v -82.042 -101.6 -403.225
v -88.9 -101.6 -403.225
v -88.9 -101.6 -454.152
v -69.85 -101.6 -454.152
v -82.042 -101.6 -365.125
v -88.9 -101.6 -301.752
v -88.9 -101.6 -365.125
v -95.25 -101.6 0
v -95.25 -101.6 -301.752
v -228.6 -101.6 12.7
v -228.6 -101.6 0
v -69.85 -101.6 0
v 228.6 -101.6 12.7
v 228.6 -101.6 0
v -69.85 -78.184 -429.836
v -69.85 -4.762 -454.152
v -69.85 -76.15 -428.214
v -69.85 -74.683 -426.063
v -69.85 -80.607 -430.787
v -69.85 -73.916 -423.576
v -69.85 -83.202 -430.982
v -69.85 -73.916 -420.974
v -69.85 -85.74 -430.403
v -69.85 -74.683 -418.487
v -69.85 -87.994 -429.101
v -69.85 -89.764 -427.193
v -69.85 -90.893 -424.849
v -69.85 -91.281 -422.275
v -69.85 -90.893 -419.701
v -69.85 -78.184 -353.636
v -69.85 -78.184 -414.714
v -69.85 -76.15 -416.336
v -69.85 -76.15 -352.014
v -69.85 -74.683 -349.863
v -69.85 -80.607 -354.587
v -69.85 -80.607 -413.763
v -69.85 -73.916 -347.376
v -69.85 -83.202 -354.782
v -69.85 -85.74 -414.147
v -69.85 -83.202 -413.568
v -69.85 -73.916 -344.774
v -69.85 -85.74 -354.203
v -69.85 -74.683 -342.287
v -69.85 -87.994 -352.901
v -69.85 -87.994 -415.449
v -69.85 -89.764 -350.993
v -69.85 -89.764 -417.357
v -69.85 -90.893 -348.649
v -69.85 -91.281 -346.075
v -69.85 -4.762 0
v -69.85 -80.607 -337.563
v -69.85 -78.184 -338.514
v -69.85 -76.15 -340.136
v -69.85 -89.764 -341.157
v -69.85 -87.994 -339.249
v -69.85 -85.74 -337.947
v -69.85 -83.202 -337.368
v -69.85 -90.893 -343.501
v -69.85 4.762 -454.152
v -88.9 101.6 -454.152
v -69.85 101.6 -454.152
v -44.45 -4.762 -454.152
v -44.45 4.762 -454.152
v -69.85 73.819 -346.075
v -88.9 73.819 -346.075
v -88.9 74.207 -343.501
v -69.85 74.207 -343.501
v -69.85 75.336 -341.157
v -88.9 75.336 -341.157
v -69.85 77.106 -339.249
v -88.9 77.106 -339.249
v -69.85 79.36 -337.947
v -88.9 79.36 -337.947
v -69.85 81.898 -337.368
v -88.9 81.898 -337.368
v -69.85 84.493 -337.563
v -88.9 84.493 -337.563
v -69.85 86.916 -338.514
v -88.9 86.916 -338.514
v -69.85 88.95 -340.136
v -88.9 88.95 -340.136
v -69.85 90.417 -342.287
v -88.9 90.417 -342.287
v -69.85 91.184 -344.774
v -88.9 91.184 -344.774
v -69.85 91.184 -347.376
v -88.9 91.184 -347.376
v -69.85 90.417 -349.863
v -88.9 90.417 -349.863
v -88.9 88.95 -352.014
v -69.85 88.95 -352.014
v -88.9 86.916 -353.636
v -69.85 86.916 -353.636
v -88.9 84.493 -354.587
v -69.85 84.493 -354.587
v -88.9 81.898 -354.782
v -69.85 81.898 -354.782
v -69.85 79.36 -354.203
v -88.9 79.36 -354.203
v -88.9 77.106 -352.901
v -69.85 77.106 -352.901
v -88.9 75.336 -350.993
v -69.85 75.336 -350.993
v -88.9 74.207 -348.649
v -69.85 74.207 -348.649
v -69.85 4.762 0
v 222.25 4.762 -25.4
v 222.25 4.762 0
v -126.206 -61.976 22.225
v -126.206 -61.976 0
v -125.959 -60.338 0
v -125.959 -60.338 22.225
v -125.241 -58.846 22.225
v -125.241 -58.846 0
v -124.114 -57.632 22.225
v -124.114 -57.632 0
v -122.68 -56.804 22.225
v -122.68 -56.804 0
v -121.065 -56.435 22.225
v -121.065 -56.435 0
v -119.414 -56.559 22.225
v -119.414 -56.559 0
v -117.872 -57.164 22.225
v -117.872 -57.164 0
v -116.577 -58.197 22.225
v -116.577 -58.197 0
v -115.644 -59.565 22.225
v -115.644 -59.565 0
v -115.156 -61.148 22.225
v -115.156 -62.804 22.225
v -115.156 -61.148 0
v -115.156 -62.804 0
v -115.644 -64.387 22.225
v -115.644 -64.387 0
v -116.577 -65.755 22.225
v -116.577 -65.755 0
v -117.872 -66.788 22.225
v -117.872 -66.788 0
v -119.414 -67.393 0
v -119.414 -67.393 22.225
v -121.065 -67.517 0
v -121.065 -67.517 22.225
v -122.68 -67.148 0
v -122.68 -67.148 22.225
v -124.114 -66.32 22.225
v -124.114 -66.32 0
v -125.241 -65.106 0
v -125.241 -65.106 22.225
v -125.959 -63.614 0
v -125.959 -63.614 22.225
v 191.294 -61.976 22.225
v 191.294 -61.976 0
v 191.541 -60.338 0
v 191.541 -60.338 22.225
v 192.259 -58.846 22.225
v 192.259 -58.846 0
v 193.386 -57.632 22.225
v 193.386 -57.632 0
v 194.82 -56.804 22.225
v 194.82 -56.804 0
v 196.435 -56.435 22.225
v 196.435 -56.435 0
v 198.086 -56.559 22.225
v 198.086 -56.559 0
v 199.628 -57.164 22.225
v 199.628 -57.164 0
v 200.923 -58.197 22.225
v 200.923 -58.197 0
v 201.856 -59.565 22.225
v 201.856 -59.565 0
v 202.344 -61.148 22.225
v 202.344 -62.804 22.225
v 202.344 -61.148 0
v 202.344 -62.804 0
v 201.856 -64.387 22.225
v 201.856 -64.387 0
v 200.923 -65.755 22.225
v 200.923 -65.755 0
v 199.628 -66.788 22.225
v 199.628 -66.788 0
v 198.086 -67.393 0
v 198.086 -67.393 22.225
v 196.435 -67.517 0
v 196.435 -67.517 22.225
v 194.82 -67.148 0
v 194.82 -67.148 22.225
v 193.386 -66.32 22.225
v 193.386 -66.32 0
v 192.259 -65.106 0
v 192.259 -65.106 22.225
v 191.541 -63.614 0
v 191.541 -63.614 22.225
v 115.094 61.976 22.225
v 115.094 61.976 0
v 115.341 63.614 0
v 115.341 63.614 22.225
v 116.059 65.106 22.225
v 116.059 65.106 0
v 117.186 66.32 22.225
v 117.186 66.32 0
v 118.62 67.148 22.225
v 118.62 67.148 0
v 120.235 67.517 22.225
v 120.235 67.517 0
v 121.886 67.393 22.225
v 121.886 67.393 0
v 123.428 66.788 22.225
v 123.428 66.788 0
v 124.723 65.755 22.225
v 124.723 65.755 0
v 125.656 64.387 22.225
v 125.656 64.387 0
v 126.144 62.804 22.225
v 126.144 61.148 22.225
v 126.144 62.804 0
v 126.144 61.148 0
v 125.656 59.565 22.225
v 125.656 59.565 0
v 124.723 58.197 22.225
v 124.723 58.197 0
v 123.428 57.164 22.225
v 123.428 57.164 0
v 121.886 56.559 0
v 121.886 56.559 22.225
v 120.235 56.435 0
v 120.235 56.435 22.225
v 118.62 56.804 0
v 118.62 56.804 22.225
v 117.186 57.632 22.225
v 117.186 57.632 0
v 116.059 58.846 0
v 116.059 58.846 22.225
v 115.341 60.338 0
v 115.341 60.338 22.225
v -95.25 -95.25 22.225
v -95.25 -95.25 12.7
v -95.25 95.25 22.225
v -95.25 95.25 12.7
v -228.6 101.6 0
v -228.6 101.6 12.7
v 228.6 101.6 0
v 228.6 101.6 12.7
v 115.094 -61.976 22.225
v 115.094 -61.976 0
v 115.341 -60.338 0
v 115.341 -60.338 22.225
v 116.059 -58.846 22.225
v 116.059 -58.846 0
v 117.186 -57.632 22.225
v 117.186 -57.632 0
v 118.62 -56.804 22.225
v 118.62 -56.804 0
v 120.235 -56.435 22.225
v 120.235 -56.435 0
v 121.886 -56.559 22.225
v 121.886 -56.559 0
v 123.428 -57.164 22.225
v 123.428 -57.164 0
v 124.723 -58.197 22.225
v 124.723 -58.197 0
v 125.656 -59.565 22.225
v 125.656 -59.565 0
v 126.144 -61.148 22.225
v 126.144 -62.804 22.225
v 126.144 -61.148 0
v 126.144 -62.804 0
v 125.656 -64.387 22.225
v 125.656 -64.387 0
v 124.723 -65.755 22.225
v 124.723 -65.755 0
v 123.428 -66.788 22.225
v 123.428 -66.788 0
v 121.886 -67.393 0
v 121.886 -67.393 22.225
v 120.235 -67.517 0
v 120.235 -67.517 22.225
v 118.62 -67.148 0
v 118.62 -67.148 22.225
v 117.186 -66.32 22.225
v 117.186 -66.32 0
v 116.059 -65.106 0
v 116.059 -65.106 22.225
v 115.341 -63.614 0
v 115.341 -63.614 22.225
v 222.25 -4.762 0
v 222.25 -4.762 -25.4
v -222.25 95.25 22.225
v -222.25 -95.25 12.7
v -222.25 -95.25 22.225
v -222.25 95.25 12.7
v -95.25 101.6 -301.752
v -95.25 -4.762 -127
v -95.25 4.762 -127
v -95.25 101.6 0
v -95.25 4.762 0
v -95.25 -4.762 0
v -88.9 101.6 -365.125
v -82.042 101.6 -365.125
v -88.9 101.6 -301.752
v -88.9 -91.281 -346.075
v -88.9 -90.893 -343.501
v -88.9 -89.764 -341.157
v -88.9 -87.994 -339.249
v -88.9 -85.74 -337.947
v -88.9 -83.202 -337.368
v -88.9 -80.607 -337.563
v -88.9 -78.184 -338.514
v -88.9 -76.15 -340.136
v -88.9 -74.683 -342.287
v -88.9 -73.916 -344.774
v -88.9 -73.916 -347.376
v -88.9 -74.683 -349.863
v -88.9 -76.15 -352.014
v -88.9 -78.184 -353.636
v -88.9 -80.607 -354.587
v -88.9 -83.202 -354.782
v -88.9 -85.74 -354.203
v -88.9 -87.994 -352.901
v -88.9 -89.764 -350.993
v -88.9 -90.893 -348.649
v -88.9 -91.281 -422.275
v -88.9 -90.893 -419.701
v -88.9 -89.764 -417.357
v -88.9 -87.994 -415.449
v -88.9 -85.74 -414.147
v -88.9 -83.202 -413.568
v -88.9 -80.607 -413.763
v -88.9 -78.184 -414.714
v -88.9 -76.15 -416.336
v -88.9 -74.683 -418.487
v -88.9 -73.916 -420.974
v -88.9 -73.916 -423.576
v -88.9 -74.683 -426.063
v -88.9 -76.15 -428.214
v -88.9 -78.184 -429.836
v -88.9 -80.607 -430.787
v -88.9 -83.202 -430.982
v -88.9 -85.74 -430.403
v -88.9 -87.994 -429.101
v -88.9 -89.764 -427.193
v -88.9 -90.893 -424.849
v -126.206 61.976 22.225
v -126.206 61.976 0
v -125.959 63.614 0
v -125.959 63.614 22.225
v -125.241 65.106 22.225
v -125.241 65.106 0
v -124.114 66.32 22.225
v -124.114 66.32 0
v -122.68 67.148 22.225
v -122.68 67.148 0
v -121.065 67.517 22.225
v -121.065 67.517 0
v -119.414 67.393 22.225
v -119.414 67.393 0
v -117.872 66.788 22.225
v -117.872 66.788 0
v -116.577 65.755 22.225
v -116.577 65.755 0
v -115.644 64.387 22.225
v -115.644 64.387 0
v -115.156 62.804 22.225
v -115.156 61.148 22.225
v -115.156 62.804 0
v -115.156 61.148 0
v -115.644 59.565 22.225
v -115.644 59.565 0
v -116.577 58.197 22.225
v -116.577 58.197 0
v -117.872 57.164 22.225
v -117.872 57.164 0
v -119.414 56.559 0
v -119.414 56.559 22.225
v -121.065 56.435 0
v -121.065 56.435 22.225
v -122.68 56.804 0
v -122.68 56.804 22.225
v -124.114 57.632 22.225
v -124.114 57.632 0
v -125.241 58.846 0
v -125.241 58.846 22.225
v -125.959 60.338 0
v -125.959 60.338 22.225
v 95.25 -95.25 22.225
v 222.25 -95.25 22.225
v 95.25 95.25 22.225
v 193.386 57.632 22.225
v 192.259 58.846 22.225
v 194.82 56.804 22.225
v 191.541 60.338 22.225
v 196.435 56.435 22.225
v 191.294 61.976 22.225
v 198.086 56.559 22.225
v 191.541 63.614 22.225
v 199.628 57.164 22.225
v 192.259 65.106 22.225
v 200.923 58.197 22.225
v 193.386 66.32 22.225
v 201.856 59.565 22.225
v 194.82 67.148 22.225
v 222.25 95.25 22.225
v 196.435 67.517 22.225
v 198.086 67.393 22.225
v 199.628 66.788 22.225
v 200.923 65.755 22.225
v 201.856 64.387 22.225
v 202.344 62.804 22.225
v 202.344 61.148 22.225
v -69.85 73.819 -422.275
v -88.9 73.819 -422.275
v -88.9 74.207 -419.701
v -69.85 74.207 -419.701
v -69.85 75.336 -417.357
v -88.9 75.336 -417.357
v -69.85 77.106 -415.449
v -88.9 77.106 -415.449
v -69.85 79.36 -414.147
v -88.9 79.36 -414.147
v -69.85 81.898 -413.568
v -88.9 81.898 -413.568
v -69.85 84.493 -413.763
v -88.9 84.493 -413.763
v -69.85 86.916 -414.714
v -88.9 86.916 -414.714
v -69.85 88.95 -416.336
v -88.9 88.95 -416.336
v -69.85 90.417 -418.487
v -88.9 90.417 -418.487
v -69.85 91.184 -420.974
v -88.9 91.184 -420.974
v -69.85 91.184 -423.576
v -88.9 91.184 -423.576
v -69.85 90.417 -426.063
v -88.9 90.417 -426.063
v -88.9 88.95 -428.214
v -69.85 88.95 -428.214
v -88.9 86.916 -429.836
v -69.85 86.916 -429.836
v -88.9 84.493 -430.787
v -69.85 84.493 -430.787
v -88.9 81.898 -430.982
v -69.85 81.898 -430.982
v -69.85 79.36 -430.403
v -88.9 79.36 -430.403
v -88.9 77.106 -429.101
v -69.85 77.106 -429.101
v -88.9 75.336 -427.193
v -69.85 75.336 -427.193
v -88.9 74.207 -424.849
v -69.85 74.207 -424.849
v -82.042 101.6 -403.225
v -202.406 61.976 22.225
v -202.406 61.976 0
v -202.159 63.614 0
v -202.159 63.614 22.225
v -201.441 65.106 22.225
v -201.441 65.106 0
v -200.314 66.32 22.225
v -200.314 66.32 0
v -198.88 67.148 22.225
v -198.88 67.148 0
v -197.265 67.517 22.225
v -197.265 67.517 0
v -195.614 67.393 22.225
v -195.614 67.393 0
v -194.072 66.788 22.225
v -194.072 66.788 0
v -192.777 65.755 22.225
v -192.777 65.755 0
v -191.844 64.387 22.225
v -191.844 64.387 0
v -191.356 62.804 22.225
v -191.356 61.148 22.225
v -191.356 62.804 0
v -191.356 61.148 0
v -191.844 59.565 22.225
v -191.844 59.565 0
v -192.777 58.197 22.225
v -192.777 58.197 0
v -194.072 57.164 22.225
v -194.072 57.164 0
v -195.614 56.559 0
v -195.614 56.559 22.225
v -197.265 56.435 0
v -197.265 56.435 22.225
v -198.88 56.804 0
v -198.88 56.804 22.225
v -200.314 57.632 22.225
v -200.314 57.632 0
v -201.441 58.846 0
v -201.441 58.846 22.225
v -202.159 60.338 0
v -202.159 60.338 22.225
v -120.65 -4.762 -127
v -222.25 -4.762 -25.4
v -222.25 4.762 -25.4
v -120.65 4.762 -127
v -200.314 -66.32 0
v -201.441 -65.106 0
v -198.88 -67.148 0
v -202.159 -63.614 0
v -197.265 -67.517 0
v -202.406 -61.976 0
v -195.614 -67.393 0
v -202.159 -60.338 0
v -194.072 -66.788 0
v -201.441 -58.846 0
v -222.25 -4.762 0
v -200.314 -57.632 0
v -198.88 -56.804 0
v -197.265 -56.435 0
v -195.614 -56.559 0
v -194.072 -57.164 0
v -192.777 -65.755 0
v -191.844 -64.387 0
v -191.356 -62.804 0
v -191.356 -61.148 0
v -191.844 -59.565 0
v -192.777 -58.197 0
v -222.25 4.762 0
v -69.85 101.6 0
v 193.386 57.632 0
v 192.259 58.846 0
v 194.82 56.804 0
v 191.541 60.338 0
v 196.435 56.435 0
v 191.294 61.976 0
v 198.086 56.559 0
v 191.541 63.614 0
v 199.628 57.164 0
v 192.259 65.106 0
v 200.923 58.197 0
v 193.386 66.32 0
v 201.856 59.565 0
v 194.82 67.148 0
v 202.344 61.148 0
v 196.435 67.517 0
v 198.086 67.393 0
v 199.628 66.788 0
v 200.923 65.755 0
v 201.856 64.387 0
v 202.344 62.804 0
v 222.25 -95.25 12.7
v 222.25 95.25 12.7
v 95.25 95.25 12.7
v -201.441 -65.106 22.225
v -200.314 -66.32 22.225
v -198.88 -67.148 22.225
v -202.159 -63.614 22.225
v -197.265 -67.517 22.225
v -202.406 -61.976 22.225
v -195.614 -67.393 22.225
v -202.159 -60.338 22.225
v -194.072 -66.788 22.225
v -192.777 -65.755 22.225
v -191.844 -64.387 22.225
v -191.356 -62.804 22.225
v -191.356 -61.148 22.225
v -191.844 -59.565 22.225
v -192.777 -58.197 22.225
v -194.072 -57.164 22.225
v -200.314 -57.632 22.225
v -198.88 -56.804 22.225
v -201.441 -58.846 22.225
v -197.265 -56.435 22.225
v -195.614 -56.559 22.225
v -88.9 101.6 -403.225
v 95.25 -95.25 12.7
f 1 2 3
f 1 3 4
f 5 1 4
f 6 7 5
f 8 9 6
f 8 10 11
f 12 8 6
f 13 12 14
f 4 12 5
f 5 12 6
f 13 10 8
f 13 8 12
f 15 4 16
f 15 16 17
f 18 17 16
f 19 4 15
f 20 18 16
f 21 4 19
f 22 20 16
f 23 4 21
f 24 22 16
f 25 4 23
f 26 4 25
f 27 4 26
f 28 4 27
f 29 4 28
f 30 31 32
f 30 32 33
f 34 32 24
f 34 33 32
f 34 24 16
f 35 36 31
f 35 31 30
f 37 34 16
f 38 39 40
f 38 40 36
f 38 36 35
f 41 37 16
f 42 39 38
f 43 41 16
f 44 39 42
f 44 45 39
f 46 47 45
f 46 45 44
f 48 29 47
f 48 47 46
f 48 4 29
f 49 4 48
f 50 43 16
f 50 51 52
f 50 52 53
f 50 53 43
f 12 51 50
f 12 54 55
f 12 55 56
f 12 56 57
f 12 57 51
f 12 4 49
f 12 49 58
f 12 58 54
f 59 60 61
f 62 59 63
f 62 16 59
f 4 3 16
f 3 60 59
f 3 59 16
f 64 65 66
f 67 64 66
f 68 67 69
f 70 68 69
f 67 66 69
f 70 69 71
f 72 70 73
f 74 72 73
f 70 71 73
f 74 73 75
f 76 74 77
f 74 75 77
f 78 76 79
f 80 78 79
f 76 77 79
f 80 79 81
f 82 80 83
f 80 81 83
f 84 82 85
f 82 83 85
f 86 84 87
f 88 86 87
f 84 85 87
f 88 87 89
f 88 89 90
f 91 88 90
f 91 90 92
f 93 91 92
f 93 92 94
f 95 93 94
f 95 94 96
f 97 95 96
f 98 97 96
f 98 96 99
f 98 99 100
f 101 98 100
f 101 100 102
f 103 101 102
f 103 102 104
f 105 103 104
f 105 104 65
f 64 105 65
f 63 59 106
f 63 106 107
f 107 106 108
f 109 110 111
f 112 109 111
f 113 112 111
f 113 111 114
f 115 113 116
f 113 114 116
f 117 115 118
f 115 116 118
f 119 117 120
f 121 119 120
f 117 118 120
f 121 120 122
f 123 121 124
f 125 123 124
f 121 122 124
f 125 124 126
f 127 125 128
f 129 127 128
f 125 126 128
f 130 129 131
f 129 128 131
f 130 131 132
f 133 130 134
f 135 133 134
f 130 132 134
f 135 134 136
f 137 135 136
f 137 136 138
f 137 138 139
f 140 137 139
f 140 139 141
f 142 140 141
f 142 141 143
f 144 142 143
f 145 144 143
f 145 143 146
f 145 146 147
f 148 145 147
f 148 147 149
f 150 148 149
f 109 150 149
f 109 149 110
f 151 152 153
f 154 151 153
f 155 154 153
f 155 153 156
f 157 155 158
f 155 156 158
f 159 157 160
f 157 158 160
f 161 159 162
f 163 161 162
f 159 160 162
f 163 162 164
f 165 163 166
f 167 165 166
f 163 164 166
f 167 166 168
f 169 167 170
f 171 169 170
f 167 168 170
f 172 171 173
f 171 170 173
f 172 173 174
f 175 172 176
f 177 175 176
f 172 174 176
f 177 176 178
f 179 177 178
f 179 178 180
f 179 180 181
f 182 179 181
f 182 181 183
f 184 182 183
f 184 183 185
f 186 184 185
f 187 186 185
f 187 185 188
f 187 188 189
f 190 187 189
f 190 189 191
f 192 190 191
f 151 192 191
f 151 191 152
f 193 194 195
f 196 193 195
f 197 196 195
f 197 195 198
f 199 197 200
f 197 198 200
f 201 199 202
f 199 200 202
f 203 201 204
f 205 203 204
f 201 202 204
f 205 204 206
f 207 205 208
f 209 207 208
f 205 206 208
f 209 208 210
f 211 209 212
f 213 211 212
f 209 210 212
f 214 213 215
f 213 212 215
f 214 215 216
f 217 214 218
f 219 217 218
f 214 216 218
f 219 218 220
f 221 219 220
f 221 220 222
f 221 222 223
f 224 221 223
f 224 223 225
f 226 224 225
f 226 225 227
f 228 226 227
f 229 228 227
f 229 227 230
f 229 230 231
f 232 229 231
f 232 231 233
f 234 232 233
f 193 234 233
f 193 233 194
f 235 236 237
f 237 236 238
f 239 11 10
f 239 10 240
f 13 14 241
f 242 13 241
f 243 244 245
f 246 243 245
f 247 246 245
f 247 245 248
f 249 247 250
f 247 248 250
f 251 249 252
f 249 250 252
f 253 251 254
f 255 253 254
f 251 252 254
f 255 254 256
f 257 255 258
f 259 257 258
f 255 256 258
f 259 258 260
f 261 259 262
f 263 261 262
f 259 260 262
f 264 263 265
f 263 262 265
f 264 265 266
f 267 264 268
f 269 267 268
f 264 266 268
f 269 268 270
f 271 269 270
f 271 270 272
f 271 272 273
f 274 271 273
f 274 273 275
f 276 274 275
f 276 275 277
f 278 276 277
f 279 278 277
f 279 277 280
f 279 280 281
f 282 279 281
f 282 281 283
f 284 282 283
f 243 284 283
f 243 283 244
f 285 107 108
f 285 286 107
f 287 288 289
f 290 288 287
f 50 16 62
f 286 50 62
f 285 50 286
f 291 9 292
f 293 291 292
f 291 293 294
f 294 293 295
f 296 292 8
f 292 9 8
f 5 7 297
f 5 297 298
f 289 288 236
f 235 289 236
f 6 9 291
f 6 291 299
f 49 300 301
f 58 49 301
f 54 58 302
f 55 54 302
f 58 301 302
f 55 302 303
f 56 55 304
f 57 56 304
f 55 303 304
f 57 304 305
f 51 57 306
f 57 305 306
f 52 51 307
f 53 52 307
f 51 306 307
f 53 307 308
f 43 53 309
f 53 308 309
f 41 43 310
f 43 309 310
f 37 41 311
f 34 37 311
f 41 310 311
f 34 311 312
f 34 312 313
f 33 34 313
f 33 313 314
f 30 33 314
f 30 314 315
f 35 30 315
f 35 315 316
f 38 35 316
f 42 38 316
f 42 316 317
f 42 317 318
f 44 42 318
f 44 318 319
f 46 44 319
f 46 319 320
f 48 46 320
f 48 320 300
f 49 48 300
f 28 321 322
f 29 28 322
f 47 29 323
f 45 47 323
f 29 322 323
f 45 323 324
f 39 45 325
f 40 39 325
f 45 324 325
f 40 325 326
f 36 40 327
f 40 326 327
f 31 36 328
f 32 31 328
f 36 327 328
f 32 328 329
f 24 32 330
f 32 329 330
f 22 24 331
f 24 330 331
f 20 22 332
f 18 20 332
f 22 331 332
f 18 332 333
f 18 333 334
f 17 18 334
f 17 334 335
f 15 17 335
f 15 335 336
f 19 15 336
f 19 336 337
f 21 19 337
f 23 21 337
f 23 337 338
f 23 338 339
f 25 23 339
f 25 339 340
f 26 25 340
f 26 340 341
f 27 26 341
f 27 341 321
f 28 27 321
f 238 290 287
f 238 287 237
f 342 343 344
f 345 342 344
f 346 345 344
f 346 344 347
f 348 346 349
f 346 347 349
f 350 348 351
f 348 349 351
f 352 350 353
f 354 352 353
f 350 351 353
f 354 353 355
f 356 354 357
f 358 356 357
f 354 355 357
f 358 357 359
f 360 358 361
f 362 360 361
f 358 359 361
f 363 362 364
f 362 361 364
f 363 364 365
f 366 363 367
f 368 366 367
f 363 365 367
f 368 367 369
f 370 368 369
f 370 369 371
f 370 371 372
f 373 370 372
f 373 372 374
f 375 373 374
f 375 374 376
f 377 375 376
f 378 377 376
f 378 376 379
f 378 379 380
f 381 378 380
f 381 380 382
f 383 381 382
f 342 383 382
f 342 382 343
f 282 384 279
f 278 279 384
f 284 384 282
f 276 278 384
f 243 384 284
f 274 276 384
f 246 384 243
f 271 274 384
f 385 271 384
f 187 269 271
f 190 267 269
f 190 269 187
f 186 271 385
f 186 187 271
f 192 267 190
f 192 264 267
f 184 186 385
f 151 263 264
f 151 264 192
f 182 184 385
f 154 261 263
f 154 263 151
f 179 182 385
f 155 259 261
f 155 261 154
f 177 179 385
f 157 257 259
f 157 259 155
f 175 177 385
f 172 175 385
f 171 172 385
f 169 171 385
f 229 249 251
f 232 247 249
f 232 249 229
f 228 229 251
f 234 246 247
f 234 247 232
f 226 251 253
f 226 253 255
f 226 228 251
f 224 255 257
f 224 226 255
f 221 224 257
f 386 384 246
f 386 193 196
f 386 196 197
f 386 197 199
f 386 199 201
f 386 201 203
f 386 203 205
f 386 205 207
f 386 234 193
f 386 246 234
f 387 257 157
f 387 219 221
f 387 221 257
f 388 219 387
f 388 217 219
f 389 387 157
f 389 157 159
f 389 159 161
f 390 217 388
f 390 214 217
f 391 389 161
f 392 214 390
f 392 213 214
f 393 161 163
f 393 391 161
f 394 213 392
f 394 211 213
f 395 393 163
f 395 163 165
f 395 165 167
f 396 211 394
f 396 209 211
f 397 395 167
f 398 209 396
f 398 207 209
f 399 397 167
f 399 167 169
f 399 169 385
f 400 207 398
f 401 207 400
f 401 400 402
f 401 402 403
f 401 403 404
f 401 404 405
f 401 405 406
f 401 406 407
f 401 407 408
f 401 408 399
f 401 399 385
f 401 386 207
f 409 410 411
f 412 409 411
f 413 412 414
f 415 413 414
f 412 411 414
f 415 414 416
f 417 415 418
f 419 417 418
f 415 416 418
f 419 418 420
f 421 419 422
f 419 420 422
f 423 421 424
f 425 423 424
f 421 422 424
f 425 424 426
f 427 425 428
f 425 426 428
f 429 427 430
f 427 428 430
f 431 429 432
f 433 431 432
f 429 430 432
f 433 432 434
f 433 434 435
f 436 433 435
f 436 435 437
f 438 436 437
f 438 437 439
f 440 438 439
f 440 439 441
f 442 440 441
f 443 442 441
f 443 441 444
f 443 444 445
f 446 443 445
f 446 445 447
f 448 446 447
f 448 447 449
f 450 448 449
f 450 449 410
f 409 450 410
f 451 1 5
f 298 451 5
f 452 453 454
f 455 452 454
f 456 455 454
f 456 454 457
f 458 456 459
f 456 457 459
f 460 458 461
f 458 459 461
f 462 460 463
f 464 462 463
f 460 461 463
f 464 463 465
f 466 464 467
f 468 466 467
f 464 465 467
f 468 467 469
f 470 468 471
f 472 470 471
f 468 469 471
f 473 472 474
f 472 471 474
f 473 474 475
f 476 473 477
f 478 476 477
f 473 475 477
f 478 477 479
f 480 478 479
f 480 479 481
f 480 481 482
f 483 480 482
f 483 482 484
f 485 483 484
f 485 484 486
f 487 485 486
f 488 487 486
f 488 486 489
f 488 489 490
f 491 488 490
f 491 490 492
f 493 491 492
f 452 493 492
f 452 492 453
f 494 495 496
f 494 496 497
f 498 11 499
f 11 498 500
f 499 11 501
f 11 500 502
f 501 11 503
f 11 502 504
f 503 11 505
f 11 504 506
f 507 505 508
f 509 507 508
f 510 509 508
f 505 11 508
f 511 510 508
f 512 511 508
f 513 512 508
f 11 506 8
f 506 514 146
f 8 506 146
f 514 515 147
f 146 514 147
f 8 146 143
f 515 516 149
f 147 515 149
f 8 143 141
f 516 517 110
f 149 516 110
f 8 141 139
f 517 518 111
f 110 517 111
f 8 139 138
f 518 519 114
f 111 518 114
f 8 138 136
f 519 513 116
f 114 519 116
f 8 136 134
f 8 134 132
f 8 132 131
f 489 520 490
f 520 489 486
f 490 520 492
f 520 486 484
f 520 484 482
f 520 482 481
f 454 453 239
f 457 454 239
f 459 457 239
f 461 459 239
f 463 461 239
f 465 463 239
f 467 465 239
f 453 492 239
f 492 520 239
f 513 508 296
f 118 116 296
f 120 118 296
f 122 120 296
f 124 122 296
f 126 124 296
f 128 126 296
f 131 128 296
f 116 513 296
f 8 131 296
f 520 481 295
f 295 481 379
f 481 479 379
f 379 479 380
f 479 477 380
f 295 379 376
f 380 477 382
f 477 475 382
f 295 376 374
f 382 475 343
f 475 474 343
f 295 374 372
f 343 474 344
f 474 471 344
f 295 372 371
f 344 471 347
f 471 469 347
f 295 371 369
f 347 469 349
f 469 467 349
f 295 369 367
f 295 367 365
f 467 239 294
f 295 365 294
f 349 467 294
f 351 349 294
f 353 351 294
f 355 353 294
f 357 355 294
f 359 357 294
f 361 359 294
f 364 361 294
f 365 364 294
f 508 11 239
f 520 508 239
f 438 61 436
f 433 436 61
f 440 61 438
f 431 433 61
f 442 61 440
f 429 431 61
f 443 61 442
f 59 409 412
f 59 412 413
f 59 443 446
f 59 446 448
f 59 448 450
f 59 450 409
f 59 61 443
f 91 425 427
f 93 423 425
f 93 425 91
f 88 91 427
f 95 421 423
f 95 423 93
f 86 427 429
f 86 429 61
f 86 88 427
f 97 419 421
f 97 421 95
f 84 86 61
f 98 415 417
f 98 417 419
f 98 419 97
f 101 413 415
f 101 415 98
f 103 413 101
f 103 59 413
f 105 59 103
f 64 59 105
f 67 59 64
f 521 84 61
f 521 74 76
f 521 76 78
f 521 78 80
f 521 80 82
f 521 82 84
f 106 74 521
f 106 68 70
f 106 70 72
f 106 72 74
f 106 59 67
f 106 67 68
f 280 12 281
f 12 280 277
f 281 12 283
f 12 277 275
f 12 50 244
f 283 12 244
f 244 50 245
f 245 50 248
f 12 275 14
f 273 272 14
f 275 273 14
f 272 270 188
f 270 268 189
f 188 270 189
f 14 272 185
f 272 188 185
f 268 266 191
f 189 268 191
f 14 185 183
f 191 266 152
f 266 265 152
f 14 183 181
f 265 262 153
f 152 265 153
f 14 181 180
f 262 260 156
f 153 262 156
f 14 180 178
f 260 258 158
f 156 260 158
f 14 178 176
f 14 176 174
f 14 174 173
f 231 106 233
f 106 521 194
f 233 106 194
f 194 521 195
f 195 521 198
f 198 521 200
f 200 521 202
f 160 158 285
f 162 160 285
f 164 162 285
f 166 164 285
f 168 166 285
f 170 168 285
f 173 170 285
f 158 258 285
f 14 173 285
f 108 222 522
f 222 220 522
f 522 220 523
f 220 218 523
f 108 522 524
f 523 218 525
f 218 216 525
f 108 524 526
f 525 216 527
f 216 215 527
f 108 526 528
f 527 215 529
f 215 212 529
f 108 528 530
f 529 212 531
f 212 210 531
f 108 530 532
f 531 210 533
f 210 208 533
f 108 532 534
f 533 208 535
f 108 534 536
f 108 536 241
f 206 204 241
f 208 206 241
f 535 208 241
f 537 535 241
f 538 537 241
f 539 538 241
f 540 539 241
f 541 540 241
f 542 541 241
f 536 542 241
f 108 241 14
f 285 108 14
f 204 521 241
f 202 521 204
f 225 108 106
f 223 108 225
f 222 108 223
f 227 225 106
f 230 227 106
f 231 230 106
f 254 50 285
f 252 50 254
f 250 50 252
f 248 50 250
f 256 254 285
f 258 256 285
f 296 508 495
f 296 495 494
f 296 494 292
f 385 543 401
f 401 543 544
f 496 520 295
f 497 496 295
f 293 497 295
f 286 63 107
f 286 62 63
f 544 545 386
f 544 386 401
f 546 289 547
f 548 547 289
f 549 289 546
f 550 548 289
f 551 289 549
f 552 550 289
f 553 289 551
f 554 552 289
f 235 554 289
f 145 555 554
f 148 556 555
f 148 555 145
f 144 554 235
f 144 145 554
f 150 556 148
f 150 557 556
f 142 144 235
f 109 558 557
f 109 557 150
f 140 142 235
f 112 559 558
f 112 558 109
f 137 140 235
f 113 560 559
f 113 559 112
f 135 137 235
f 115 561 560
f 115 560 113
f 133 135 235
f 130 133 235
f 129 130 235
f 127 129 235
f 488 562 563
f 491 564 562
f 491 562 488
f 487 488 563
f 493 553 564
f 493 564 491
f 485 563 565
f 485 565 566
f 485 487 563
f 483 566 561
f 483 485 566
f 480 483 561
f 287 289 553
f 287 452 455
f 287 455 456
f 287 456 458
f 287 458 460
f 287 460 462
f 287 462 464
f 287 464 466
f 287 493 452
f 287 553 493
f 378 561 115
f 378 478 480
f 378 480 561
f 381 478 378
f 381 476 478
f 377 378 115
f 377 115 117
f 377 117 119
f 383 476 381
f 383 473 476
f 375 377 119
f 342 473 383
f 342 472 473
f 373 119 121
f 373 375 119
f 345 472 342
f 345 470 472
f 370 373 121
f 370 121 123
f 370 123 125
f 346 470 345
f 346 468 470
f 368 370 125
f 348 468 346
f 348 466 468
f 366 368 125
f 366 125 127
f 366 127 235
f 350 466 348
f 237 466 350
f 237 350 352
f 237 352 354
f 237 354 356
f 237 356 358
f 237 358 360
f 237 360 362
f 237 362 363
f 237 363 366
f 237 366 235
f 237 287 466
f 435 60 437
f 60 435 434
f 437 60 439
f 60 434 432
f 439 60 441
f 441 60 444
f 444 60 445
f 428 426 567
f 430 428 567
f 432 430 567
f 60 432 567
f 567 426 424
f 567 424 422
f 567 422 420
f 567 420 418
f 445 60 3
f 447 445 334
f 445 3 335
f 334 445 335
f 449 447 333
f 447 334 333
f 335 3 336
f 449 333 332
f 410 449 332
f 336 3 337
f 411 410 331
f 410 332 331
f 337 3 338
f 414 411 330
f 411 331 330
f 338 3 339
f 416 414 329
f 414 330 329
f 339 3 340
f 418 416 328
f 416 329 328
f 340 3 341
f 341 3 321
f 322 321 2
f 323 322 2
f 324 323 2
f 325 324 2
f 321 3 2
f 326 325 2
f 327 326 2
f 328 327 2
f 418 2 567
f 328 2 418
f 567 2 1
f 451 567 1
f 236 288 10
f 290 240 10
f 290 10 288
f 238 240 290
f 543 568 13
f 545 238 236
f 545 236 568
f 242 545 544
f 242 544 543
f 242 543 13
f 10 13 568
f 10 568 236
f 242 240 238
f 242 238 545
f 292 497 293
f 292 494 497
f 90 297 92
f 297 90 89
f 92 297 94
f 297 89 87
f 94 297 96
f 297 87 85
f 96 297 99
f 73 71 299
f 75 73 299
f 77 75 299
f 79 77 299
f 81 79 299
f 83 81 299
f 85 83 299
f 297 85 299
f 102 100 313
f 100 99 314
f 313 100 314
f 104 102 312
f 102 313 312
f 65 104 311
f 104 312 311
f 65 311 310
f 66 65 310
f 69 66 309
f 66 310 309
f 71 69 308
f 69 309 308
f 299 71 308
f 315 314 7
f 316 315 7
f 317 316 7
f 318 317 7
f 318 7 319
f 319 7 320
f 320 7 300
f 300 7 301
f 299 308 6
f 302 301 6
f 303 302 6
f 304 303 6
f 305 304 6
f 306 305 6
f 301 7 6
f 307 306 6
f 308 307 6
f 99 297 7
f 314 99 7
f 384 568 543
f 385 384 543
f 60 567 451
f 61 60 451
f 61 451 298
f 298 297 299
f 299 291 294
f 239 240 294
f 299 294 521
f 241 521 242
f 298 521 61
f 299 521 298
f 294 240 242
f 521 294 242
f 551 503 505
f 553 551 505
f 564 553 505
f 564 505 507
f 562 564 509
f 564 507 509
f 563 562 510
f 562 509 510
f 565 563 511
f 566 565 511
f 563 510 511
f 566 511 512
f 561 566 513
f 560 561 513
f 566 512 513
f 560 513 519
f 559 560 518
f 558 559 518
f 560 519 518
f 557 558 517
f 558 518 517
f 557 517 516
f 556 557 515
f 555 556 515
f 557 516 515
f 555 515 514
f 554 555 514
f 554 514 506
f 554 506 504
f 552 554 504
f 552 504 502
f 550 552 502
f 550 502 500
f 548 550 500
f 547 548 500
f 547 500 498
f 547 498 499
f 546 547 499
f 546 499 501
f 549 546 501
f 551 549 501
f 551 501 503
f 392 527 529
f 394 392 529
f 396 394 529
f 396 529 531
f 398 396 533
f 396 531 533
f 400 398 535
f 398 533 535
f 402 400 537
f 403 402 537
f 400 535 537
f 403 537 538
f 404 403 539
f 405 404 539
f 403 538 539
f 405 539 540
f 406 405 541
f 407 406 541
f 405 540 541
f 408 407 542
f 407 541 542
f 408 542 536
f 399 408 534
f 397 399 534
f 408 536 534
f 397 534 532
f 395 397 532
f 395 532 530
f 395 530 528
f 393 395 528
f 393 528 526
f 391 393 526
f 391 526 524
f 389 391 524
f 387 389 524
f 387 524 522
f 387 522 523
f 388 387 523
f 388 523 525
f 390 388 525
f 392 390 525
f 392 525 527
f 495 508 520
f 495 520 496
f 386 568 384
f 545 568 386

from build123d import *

# Parameters (mm, degrees)
F0_W      = 457.2
F0_H      = 203.2
F1_DEPTH  = 12.7
F2_W      = 127
F2_H      = 190.5
F3_DEPTH  = 9.525
F5_D      = 11.1125
F7_DEPTH  = 4.7625
F9_DEPTH  = 4.7625
F10_W     = 25.4
F10_H     = 454.152
F11_DEPTH = 101.6
F12_W     = 44.551104
F12_H     = 159.36184
F13_DEPTH = 203.201
F14_W     = 96.83972
F14_H     = 38.1
F15_DEPTH = 203.201
F17_D     = 17.4625


with BuildPart() as f1:
    # F0 (on Top) → F1 (new body)
    with BuildSketch(Plane.XY):
        Rectangle(F0_W, F0_H)
    extrude(amount=F1_DEPTH)

    # F2 (on face) → F3 (join)
    with BuildSketch(Plane.XY.offset(12.7)):
        with Locations((158.75, 0)):
            Rectangle(F2_W, F2_H)
        with Locations((-158.75, 0)):
            Rectangle(F2_W, F2_H)
    extrude(amount=F3_DEPTH)

    # F5 (through all)
    with Locations(Plane.XY.offset(22.225)):
        with Locations((-196.85, 61.976), (-120.65, 61.976), (-196.85, -61.976), (-120.65, -61.976), (120.65, 61.976), (196.85, 61.976), (196.85, -61.976), (120.65, -61.976)):
            Hole(F5_D / 2)

    # F6 (on Front) → F7 (join, symmetric)
    with BuildSketch(Plane.XZ):
        Polygon((-95.25, 0), (-222.25, 0), (-222.25, -25.4), (-120.65, -127), (-95.25, -127), align=None)
    extrude(amount=F7_DEPTH, both=True)

    # F8 (on Front) → F9 (join, symmetric)
    with BuildSketch(Plane.XZ):
        Polygon((222.25, -25.4), (222.25, 0), (-69.85, 0), (-69.85, -454.152), (-44.45, -454.152), align=None)
    extrude(amount=F9_DEPTH, both=True)

    # F10 (on Front) → F11 (join, symmetric)
    with BuildSketch(Plane.XZ):
        with Locations((-82.55, -227.076)):
            Rectangle(F10_W, F10_H)
    extrude(amount=F11_DEPTH, both=True)

    # F12 (on face) → F13 (cut, through all)
    with BuildSketch(Plane.XZ.offset(101.6)):
        with Locations((-111.175552, -381.43292)):
            Rectangle(F12_W, F12_H)
    extrude(amount=-F13_DEPTH, mode=Mode.SUBTRACT)

    # F14 (on face) → F15 (cut, through all)
    with BuildSketch(Plane.XZ.offset(101.6)):
        with Locations((-130.46186, -384.175)):
            Rectangle(F14_W, F14_H)
    extrude(amount=-F15_DEPTH, mode=Mode.SUBTRACT)

    # F17 (through all)
    with Locations(Plane.YZ.offset(-69.85)):
        with Locations((-82.55, -346.075), (-82.55, -422.275), (82.55, -422.275), (82.55, -346.075)):
            Hole(F17_D / 2)


solid = f1.part
